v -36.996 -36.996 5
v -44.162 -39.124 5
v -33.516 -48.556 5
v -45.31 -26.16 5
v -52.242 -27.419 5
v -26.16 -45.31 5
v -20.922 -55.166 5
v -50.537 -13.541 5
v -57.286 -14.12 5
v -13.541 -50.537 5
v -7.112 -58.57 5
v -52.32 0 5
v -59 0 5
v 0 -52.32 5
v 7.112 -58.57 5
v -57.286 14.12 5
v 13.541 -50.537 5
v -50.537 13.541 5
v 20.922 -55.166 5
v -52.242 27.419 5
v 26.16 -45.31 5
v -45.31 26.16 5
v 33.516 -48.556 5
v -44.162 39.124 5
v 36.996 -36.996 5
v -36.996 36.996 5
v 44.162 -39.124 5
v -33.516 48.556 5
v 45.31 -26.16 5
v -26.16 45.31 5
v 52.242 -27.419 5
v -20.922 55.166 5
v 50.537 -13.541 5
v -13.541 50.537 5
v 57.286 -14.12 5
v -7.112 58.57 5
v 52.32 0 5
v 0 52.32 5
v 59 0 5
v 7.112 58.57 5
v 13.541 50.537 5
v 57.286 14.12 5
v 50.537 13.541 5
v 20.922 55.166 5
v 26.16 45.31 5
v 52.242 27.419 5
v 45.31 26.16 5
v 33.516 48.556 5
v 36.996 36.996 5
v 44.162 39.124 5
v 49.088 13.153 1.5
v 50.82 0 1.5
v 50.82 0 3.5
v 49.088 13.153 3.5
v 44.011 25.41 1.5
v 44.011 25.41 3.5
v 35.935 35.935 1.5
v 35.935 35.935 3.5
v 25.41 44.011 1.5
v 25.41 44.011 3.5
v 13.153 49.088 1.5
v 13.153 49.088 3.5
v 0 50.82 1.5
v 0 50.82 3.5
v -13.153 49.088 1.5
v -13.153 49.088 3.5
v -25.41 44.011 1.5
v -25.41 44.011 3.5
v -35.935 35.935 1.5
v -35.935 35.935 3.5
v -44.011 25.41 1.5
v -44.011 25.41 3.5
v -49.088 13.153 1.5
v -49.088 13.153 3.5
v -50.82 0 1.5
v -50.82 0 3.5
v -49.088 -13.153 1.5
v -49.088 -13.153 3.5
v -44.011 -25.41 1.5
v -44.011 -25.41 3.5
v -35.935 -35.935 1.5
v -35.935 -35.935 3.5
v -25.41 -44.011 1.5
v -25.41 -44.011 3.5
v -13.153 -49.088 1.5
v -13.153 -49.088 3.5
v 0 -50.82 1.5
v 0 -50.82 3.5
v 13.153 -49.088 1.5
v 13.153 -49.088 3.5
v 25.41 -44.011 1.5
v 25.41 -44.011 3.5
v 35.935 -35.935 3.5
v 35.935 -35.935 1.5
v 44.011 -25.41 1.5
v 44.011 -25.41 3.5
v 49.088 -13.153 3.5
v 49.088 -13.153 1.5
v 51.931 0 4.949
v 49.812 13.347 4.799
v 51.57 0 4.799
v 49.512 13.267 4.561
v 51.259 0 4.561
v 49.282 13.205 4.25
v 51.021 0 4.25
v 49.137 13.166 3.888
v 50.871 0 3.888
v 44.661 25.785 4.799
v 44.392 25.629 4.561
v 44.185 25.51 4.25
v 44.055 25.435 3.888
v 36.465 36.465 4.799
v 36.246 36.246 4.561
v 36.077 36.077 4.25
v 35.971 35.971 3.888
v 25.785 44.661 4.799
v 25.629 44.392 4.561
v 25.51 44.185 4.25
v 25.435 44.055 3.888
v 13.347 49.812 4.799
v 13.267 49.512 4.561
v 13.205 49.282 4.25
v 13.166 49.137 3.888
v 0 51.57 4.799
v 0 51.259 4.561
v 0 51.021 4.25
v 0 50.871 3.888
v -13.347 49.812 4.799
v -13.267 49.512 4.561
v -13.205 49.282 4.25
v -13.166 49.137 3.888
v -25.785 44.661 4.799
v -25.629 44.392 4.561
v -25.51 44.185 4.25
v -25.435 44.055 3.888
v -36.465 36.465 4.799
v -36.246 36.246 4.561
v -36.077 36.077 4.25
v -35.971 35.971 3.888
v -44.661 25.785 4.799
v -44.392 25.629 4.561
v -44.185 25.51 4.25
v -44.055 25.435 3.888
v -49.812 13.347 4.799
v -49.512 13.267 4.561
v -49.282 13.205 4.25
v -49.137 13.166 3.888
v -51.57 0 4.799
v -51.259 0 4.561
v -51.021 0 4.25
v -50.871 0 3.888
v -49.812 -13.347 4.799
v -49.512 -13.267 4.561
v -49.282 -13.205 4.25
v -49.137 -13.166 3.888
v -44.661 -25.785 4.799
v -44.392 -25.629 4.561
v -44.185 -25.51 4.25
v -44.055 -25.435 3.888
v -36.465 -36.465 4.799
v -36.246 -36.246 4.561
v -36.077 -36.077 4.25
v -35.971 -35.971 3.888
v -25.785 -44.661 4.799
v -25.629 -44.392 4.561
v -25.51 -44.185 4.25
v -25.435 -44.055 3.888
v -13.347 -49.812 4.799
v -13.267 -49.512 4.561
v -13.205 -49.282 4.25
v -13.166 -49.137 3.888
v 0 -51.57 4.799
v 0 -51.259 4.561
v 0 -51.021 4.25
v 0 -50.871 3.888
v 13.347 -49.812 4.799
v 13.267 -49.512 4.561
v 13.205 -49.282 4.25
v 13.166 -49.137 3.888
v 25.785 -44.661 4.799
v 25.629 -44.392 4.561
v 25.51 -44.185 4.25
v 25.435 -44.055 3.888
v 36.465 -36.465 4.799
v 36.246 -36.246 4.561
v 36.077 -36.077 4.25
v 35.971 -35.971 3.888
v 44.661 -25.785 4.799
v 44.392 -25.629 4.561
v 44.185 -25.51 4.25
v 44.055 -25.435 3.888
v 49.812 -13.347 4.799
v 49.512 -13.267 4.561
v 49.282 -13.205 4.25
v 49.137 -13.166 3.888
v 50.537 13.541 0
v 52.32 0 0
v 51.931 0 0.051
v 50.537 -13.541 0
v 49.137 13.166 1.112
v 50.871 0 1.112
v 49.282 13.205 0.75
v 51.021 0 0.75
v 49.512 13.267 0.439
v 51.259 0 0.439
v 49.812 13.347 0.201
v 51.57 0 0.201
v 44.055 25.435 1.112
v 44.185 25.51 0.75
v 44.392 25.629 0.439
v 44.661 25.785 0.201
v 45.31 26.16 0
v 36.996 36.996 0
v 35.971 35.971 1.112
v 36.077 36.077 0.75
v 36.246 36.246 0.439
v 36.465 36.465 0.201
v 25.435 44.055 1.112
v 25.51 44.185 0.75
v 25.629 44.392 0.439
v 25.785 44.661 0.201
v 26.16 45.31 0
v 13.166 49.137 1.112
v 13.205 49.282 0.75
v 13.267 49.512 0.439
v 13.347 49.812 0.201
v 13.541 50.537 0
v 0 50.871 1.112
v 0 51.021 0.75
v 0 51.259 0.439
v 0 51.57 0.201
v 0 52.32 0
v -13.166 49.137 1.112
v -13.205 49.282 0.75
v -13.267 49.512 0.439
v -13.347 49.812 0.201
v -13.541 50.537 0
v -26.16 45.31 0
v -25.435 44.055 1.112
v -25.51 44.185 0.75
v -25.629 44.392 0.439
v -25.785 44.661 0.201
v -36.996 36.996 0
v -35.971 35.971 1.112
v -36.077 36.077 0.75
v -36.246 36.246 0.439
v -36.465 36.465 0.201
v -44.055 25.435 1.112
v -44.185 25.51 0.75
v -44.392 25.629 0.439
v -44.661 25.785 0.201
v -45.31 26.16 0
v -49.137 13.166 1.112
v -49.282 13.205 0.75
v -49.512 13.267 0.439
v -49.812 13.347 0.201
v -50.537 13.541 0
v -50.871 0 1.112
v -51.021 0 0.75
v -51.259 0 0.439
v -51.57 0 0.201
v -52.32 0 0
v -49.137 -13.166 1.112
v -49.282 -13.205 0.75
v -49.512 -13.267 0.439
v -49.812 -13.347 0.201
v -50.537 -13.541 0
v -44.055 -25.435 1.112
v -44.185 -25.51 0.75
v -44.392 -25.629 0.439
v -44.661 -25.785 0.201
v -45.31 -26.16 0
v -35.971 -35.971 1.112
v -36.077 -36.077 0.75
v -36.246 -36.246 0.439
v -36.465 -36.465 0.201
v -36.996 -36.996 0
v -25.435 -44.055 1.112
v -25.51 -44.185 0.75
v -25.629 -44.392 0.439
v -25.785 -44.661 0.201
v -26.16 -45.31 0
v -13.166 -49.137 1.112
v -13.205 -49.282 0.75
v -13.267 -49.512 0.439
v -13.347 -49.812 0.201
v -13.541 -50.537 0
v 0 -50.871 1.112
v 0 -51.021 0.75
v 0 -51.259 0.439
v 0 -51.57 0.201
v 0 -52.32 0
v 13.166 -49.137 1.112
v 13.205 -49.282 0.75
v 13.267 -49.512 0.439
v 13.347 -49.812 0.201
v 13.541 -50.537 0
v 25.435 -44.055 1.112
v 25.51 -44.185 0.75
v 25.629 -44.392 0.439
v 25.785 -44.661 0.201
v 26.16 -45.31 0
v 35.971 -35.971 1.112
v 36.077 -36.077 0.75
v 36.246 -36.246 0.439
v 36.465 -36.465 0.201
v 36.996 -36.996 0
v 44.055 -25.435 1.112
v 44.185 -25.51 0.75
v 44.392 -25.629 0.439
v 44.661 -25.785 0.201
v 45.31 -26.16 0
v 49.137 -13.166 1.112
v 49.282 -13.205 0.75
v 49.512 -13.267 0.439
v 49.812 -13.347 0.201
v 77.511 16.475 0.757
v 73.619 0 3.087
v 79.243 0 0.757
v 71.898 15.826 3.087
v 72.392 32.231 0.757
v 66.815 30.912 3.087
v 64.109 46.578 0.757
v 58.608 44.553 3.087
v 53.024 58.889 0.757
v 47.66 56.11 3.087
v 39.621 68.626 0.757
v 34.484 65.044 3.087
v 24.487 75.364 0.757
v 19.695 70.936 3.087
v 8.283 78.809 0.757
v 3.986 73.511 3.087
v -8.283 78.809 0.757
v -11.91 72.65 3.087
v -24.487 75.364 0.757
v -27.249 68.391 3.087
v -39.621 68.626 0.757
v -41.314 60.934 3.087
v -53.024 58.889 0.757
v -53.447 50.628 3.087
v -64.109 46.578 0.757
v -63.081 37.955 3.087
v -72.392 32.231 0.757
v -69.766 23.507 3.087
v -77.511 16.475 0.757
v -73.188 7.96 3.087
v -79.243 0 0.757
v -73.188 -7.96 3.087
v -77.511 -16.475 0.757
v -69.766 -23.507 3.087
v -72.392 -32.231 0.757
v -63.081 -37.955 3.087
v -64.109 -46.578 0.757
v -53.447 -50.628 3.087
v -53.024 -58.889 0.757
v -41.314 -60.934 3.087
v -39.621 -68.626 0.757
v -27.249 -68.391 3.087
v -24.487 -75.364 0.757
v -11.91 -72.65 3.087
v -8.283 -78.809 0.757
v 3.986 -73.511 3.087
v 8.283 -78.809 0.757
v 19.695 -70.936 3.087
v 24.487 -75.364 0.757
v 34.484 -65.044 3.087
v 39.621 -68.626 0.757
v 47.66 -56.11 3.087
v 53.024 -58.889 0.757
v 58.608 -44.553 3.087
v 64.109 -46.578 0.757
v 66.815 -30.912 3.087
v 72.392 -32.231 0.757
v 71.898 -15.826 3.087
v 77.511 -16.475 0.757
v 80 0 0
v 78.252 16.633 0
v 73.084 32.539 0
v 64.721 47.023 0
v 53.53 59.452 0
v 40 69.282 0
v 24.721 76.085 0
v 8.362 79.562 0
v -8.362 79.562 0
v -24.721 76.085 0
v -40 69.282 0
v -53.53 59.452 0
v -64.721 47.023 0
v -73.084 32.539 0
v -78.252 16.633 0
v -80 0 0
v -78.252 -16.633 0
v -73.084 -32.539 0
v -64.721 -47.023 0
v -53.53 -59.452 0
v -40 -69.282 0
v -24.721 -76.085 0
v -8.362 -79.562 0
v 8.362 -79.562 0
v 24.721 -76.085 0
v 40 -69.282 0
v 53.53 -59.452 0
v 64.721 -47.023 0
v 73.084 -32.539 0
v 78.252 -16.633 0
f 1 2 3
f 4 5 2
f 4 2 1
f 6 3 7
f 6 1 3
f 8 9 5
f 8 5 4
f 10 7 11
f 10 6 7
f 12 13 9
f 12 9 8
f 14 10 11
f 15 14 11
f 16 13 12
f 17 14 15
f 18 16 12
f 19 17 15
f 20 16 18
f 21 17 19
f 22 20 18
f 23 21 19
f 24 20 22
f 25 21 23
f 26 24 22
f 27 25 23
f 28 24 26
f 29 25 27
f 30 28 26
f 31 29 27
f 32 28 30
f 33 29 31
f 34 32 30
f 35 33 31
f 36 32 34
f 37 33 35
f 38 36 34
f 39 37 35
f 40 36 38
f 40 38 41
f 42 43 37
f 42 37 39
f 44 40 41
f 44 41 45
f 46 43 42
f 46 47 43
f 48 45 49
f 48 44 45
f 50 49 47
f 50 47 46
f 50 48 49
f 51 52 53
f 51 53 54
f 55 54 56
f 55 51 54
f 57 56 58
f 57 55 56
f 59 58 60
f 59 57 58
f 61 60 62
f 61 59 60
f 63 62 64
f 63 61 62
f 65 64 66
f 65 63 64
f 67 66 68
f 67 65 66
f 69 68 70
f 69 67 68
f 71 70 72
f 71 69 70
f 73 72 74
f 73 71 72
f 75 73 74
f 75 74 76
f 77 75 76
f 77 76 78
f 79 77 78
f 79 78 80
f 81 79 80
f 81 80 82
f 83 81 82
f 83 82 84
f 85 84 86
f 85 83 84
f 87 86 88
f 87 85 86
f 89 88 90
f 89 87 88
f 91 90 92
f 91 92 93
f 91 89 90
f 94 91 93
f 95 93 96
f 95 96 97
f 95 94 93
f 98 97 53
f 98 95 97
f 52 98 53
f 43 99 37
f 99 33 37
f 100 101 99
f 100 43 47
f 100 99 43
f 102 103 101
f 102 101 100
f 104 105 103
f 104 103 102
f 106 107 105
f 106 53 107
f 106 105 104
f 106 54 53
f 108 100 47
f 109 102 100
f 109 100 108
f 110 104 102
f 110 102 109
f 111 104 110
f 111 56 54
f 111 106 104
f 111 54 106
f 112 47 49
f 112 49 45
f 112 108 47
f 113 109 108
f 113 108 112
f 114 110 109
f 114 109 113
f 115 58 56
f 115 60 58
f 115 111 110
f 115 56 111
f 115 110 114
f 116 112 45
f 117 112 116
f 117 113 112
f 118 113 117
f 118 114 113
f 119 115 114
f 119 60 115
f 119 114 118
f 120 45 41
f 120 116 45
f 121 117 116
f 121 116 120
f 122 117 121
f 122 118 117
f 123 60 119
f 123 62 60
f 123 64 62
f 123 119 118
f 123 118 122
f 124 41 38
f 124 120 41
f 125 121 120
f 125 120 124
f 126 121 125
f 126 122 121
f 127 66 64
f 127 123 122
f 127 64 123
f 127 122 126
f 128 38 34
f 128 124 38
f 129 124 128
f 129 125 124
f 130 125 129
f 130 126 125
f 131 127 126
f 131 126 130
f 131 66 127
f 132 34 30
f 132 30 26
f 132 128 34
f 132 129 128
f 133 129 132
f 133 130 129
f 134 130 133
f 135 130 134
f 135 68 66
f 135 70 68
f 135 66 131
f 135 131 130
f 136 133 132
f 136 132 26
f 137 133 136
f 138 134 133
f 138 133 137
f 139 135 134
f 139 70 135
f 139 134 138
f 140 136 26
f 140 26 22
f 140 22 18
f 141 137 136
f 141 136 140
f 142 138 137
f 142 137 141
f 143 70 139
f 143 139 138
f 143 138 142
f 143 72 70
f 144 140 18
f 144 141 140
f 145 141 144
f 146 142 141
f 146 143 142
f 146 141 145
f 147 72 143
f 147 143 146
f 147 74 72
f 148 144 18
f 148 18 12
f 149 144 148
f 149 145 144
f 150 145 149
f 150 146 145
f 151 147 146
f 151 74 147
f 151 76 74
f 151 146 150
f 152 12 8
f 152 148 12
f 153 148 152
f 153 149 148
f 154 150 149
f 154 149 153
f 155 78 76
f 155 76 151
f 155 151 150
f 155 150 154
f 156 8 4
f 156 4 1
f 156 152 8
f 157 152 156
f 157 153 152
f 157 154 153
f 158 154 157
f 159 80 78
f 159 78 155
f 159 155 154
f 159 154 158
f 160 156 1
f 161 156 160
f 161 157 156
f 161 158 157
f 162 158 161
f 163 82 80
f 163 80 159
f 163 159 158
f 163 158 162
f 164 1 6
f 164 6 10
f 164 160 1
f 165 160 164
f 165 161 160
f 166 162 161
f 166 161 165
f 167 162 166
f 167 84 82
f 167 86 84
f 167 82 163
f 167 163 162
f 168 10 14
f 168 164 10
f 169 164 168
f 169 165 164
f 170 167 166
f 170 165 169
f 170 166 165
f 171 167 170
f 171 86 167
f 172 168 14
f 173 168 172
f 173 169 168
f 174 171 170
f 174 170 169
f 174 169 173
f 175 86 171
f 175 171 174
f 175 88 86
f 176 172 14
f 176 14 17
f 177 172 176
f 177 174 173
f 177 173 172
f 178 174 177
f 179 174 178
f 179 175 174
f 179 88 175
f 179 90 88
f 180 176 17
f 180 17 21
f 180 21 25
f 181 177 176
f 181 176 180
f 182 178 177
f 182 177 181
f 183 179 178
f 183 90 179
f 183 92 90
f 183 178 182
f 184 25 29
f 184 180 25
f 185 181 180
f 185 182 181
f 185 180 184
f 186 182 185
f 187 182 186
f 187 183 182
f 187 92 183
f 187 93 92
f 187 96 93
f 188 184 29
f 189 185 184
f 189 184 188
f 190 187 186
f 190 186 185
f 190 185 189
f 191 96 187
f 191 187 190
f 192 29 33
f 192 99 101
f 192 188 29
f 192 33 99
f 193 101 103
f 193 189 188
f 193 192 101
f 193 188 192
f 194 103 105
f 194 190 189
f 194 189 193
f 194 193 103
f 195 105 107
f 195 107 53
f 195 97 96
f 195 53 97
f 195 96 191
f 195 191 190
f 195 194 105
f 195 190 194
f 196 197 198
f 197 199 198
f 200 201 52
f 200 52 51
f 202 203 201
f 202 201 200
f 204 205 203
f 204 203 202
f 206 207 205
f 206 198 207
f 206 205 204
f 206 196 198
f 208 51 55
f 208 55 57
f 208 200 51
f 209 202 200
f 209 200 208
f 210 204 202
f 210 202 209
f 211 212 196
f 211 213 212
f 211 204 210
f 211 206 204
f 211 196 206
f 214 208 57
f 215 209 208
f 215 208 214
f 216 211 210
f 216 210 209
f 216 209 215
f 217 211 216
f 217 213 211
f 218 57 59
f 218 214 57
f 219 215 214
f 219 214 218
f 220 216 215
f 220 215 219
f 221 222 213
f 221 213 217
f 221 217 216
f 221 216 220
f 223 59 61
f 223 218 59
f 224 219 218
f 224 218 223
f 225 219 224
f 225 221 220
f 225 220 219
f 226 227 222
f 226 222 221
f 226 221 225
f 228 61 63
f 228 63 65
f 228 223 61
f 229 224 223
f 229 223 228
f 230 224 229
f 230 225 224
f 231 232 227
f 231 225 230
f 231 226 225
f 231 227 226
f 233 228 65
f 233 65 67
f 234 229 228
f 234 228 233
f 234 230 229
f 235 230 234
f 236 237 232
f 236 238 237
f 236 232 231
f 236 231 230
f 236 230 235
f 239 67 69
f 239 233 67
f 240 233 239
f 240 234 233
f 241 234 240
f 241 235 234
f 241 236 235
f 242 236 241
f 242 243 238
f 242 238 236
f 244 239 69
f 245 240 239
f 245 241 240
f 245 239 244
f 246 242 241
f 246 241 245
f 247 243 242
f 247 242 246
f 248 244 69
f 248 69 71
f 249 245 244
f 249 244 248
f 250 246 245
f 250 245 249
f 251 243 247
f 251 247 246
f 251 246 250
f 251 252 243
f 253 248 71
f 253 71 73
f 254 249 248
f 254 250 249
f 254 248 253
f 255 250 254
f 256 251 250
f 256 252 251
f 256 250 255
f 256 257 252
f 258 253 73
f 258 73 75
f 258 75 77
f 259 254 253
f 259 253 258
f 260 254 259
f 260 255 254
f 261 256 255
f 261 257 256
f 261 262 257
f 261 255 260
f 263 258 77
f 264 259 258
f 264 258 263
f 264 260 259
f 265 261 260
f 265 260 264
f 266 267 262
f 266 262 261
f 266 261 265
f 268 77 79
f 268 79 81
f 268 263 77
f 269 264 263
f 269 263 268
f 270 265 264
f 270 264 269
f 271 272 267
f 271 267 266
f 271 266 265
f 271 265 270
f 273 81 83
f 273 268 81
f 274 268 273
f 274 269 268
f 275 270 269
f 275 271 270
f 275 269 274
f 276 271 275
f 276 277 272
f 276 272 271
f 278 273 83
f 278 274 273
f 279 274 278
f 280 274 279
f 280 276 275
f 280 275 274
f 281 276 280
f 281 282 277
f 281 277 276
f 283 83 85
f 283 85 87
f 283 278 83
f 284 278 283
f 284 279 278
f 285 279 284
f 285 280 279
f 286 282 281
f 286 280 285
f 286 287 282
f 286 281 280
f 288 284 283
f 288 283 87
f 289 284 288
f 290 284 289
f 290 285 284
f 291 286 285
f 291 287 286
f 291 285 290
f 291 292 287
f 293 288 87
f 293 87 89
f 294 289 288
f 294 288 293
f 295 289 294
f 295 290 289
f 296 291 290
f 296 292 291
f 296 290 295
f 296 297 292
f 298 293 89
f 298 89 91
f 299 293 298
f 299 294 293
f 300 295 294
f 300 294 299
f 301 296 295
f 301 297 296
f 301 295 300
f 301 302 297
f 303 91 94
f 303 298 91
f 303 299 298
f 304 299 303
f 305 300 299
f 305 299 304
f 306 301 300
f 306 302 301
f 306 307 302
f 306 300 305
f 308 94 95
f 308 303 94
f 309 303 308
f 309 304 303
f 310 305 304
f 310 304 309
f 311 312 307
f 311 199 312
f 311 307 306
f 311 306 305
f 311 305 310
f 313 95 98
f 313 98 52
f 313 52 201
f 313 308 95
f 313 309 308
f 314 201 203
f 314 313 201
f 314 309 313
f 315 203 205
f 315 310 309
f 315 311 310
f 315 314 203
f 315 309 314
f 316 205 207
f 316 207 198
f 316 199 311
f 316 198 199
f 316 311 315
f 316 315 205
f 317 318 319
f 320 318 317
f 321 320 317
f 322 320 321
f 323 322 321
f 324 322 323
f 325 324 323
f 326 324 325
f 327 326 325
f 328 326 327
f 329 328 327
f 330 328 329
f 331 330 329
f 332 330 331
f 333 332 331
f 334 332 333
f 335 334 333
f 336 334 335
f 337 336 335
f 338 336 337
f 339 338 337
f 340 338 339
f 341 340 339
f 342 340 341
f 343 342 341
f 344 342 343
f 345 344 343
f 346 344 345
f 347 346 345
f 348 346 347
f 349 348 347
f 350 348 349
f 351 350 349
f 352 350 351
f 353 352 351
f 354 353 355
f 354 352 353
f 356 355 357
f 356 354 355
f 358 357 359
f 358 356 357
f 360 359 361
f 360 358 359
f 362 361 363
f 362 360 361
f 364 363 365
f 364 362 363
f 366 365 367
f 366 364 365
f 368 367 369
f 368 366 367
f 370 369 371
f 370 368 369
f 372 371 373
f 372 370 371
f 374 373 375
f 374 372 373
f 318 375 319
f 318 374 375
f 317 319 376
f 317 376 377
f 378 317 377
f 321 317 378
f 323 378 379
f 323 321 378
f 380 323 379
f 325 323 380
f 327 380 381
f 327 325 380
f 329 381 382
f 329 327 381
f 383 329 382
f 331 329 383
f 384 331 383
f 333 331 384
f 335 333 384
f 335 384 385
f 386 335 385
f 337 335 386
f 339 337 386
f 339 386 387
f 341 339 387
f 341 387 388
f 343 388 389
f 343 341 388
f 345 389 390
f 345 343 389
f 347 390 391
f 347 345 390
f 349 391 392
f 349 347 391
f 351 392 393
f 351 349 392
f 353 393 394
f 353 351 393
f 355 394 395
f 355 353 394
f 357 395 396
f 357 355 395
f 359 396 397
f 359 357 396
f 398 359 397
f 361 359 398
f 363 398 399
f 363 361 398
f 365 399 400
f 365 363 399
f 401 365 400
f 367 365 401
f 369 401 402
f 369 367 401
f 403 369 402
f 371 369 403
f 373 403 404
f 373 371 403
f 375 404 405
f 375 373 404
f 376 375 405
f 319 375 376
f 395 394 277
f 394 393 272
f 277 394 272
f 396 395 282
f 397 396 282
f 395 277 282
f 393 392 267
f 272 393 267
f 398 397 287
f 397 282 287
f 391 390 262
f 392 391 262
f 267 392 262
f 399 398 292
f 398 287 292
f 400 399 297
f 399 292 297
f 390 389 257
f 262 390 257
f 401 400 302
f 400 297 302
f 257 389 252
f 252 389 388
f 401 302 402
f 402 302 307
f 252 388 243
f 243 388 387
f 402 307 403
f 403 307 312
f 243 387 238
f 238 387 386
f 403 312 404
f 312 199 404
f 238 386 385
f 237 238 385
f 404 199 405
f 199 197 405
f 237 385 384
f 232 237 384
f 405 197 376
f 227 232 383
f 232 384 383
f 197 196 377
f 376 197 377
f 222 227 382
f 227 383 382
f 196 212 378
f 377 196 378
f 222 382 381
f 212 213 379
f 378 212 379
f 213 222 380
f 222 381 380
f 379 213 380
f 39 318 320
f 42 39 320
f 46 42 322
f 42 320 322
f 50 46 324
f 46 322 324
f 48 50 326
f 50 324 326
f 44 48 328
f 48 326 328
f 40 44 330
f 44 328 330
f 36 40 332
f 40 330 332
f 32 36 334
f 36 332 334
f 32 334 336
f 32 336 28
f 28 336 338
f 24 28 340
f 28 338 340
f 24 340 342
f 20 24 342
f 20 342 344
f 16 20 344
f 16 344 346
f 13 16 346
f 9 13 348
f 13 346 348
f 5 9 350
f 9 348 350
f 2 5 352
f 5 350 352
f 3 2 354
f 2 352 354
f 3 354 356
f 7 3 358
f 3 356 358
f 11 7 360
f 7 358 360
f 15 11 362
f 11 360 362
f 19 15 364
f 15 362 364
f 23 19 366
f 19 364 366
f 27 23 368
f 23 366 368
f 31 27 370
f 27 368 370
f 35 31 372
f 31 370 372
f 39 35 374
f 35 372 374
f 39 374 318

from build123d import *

# Parameters (mm, degrees)
F0_R     = 80
F0_R_2   = 50.8196445325
F1_DEPTH = 5
F2_SIZE  = 4.99999
F3_SIZE  = 6
F4_R     = 1.5
F5_R     = 1.5
F6_SIZE2 = 5
F6_SIZE  = 10


# Not quite as in the source:
# - a fillet or chamfer is up to 0.001 mm smaller than in the source, because OpenCascade refuses the exact size


with BuildPart() as f1:
    # F0 (on Top) → F1 (new body)
    with BuildSketch(Plane.XY):
        Circle(F0_R)
        Circle(F0_R_2, mode=Mode.SUBTRACT)
    extrude(amount=F1_DEPTH)

    # F2 (size 5 in the source; OpenCascade refuses exactly that, so slightly less here)
    f2_edges = [f1.edges().sort_by_distance(p)[0] for p in [
        (-80, 0, 5),
    ]]
    chamfer(f2_edges, length=F2_SIZE)

    # F3
    f3_edges = [f1.edges().sort_by_distance(p)[0] for p in [
        (-75.00001, 0, 5),
    ]]
    chamfer(f3_edges, length=F3_SIZE)

    # F4
    f4_edges = [f1.edges().sort_by_distance(p)[0] for p in [
        (-50.819645, 0, 5),
    ]]
    fillet(f4_edges, radius=F4_R)

    # F5
    f5_edges = [f1.edges().sort_by_distance(p)[0] for p in [
        (-50.819645, 0, 0),
    ]]
    fillet(f5_edges, radius=F5_R)

    # F6
    f6_edges = [f1.edges().sort_by_distance(p)[0] for p in [
        (-69.00001, 0, 5),
    ]]
    chamfer(f6_edges, length=F6_SIZE, length2=F6_SIZE2)


solid = f1.part
